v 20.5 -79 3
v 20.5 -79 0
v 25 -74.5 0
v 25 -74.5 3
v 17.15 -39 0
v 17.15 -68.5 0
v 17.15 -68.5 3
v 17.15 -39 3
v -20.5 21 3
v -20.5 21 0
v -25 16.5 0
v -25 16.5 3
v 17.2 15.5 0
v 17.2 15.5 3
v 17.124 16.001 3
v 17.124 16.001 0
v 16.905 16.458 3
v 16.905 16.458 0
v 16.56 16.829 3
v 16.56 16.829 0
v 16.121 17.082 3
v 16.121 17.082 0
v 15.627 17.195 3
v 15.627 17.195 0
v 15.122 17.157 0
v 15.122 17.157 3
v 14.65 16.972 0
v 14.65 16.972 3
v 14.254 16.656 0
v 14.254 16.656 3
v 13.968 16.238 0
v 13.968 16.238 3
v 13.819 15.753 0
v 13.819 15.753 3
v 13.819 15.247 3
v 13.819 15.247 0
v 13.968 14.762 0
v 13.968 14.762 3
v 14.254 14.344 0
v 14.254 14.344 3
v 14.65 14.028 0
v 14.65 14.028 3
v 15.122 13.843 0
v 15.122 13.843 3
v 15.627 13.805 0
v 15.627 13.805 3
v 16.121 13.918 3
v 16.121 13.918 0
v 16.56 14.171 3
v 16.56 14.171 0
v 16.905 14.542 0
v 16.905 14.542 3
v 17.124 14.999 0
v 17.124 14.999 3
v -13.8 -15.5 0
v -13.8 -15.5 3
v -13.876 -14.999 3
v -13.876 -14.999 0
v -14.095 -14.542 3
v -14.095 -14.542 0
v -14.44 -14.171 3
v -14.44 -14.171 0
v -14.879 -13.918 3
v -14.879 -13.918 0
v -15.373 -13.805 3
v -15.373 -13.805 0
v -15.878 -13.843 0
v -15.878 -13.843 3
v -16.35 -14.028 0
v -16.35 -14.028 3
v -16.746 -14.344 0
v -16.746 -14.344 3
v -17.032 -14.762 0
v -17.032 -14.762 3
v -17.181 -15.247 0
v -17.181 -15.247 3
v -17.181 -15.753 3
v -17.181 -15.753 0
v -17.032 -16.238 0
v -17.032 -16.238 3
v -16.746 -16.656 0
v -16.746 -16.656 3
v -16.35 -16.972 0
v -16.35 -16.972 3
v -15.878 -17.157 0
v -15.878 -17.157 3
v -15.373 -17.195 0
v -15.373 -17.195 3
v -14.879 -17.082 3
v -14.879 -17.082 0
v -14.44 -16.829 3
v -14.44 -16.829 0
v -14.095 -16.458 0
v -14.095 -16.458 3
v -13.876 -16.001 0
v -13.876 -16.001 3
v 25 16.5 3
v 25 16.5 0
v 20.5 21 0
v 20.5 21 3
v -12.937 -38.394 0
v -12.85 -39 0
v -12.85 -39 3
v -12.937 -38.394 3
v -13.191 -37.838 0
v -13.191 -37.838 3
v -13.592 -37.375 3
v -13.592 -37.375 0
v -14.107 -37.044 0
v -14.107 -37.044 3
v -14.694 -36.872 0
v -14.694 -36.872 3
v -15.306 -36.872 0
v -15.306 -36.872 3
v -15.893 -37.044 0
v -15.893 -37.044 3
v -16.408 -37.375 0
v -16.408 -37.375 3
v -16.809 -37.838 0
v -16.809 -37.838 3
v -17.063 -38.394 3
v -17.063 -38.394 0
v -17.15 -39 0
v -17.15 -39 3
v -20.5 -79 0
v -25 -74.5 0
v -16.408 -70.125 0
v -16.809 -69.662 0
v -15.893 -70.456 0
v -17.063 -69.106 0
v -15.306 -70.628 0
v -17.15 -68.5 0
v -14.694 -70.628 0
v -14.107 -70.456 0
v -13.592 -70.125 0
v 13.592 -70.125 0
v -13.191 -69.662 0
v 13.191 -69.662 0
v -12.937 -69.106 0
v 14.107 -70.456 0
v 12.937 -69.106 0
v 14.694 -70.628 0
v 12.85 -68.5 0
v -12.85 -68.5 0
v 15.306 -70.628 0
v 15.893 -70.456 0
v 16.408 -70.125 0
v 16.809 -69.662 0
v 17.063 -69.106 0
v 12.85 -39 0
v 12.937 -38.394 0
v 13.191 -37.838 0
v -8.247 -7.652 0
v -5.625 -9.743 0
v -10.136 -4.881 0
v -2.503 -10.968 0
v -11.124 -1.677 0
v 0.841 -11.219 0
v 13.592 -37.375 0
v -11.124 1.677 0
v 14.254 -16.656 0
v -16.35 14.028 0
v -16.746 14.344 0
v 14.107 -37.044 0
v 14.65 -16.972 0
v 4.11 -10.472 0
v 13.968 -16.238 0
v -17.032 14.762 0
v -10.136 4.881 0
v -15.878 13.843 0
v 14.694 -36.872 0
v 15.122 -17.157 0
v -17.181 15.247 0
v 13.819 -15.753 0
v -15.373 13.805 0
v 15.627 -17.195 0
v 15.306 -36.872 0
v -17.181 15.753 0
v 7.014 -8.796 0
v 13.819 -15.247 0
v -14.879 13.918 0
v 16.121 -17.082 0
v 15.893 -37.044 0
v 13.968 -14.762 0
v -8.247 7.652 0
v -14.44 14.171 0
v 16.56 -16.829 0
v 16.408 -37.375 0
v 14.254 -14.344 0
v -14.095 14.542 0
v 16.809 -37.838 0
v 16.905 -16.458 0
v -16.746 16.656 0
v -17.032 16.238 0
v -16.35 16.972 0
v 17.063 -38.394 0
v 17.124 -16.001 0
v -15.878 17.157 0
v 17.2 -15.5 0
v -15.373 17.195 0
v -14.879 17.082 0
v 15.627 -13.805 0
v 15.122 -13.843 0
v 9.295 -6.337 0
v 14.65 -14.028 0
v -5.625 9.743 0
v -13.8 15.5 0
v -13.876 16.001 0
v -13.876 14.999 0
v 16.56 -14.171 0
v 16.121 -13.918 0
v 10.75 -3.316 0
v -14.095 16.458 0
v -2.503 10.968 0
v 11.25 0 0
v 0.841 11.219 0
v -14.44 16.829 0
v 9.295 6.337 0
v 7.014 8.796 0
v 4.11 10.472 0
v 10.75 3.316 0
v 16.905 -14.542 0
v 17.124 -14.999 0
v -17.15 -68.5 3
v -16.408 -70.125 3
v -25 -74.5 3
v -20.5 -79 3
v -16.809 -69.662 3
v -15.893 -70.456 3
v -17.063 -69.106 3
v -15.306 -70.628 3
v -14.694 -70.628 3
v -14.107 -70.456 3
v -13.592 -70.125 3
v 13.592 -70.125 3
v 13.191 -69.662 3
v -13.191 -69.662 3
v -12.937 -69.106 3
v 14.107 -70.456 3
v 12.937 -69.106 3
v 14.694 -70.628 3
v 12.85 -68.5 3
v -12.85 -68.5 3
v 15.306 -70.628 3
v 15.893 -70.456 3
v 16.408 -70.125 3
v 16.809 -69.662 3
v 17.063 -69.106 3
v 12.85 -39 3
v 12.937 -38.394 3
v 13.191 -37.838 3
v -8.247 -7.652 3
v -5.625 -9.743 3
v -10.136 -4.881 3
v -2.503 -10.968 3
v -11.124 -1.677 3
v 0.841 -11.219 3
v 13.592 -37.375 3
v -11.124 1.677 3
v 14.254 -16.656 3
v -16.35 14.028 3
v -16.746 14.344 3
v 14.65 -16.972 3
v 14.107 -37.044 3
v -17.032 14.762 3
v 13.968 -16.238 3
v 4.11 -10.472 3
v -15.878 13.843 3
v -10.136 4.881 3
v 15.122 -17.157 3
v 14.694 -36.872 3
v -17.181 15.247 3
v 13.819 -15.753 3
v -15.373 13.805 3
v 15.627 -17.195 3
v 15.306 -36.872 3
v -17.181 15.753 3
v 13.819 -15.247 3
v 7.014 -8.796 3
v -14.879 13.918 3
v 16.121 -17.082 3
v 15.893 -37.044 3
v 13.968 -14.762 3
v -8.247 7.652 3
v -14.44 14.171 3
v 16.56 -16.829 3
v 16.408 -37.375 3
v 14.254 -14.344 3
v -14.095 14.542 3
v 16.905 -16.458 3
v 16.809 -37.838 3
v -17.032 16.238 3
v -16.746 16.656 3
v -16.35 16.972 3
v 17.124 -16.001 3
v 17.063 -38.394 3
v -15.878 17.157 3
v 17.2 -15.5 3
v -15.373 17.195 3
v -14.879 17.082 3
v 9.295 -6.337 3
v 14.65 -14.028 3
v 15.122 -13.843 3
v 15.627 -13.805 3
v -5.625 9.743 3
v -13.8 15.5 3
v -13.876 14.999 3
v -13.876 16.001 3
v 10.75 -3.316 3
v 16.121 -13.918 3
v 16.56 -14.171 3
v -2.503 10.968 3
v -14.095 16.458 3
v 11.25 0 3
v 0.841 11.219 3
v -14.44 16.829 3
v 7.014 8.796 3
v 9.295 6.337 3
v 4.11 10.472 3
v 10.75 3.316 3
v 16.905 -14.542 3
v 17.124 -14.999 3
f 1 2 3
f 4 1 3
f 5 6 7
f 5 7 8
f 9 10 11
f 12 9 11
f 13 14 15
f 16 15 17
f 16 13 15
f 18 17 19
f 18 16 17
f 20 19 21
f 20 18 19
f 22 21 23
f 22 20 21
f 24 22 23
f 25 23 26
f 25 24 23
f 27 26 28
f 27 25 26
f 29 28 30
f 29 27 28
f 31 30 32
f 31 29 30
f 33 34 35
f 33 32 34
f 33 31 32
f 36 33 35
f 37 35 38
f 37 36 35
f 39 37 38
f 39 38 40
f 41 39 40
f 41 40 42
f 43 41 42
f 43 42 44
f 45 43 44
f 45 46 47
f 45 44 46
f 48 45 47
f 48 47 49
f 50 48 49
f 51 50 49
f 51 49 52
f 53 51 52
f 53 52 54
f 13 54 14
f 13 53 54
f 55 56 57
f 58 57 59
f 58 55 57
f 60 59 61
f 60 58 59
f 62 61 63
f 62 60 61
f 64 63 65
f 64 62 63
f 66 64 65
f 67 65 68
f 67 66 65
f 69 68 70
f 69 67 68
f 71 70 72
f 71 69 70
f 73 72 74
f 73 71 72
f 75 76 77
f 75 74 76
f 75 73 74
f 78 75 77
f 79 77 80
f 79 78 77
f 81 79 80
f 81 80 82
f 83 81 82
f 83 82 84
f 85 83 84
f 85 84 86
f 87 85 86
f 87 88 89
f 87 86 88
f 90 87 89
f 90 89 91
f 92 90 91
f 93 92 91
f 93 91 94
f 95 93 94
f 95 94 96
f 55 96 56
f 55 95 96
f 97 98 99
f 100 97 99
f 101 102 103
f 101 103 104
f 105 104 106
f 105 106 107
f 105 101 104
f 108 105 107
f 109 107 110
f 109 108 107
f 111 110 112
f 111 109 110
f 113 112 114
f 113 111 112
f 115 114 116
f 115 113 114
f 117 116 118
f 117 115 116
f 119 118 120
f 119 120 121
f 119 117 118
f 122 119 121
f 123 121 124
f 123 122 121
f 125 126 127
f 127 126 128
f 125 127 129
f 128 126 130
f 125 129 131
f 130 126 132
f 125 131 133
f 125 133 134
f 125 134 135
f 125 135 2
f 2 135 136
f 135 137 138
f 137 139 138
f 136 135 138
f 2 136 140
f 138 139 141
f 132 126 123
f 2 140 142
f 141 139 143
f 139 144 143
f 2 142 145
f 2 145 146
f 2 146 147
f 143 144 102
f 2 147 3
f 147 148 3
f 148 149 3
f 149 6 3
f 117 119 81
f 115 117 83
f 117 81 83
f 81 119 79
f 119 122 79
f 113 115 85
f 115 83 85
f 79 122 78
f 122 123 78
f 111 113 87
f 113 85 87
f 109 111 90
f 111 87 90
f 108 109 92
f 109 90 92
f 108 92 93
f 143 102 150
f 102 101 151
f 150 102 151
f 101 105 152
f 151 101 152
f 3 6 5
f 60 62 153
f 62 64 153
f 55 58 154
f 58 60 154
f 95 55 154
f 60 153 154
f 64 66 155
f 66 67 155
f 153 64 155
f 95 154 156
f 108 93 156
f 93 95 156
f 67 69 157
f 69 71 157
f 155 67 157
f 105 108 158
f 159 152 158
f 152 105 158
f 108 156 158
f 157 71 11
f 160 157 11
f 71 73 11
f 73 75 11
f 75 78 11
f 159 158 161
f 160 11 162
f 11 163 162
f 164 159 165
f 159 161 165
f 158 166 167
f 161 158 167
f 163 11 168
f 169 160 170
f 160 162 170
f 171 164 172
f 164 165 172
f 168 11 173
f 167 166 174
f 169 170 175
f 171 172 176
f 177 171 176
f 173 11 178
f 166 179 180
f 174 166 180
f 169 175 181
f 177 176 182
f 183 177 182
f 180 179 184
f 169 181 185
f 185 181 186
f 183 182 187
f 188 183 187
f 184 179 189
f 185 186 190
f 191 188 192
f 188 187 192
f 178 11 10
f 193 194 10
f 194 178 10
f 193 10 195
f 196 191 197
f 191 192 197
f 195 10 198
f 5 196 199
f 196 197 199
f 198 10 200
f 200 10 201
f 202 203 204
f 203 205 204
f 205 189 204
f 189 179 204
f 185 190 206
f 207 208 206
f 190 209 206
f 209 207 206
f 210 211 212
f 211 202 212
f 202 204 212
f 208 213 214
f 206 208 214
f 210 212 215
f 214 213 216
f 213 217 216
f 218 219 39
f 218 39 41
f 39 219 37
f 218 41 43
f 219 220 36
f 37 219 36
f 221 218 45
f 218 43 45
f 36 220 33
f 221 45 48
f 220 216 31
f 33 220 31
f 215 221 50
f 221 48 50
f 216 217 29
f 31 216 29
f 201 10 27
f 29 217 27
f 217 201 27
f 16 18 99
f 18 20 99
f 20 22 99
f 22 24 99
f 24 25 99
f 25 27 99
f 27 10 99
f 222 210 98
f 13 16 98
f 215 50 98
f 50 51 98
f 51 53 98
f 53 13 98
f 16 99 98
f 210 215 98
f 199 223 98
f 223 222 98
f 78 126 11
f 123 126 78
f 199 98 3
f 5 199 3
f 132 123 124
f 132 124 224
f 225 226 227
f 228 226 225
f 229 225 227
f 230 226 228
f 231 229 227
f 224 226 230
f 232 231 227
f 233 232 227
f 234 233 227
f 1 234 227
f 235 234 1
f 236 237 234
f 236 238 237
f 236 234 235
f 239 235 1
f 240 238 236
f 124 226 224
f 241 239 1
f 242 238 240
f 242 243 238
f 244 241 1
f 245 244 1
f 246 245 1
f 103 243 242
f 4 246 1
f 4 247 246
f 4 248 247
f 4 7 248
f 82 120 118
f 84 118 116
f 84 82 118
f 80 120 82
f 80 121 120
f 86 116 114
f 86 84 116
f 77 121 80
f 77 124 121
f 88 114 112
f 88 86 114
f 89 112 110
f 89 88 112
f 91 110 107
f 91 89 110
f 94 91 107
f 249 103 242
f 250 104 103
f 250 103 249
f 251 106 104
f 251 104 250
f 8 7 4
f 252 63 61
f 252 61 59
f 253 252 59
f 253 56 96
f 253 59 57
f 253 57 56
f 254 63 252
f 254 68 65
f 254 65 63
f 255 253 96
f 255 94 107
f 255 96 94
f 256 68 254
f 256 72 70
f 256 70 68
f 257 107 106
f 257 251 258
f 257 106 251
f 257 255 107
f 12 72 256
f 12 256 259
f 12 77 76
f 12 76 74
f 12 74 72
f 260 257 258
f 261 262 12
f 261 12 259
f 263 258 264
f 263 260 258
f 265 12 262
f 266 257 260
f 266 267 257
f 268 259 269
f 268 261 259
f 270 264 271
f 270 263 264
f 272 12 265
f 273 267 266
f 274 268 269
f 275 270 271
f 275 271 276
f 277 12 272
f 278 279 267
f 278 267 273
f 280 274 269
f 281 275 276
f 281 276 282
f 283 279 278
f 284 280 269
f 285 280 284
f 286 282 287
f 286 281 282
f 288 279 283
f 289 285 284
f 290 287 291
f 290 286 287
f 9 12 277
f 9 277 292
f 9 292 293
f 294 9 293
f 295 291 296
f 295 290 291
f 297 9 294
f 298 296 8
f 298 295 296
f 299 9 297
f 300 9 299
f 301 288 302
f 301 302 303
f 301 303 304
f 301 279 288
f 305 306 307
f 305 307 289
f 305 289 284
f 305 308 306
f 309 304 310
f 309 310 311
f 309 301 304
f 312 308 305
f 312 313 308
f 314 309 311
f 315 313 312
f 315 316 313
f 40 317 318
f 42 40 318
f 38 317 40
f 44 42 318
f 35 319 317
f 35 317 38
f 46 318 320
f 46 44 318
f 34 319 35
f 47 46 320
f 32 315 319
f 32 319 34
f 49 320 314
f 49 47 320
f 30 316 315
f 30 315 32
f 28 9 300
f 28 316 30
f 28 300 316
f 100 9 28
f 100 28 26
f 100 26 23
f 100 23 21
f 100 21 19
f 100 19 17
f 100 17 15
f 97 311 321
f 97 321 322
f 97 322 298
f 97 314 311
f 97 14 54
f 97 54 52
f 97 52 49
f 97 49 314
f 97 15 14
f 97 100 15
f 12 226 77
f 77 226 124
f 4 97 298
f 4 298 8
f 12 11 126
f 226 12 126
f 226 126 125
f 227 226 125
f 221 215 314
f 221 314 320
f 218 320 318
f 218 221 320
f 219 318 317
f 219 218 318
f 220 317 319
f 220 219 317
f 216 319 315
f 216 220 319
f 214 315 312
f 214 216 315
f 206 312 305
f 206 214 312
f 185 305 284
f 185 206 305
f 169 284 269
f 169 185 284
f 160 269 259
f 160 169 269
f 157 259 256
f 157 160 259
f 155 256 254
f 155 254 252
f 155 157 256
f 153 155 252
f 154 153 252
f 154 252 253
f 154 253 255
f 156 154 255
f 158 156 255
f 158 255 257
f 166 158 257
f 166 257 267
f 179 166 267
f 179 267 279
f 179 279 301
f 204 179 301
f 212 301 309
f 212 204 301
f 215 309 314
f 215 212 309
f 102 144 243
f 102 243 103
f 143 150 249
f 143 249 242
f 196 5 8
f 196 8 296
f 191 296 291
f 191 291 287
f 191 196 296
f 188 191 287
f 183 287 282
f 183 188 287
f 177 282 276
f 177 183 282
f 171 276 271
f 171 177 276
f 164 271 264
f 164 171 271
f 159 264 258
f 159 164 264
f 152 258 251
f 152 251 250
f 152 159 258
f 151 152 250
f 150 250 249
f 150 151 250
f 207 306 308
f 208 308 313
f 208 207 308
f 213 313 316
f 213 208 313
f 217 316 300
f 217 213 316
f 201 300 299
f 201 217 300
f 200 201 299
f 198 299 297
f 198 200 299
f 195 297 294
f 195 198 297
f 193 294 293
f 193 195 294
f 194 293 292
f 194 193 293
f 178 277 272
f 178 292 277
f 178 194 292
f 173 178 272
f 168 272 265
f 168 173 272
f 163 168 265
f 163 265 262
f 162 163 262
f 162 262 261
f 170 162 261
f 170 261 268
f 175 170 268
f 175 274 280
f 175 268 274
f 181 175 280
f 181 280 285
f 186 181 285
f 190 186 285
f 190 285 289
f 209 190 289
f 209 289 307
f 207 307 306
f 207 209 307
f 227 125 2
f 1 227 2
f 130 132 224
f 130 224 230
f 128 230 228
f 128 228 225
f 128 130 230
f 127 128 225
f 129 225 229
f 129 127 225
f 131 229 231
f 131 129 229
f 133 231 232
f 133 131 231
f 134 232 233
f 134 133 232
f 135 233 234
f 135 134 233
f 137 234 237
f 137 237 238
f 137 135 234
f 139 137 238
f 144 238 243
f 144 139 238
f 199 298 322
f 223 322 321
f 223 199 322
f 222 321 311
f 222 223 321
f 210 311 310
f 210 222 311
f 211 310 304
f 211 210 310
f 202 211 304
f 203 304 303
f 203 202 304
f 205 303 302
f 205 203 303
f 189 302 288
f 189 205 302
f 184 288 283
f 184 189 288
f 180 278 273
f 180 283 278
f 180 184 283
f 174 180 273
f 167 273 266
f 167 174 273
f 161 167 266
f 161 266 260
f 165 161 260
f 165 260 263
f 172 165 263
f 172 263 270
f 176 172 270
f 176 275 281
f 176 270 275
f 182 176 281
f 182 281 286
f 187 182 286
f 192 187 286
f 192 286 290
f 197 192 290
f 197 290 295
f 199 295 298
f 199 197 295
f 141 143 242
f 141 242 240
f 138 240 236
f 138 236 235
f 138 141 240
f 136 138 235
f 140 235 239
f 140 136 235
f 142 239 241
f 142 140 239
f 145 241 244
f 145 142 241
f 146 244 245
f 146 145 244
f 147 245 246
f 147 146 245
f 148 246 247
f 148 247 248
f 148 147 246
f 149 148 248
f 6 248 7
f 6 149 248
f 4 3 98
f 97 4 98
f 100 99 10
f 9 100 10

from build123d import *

# Parameters (mm, degrees)
SKETCH_R    = 11.25
PAD_DEPTH   = 3
SKETCH001_R = 1.7
HOLE_DEPTH  = 25


with BuildPart() as part:
    # Sketch → Pad (new body)
    with BuildSketch(Plane.XY):
        Polygon((20.5, 21), (-20.5, 21), (-25, 16.5), (-25, -74.5), (-20.5, -79), (20.5, -79), (25, -74.5), (25, 16.5), align=None)
        Circle(SKETCH_R, mode=Mode.SUBTRACT)
        with BuildLine():
            ThreePointArc((-12.85, -39), (-15, -36.85), (-17.15, -39))
            Line((-17.15, -39), (-17.15, -68.5))
            ThreePointArc((-17.15, -68.5), (-15, -70.65), (-12.85, -68.5))
            Line((-12.85, -68.5), (-12.85, -39))
        make_face(mode=Mode.SUBTRACT)
        with BuildLine():
            ThreePointArc((17.15, -39), (15, -36.85), (12.85, -39))
            Line((12.85, -39), (12.85, -68.5))
            ThreePointArc((12.85, -68.5), (15, -70.65), (17.15, -68.5))
            Line((17.15, -68.5), (17.15, -39))
        make_face(mode=Mode.SUBTRACT)
    extrude(amount=PAD_DEPTH)

    # Sketch001 → Hole (cut)
    with BuildSketch(Plane.XY):
        with Locations((-15.5, 15.5)):
            Circle(SKETCH001_R)
        with Locations((15.5, 15.5)):
            Circle(SKETCH001_R)
        with Locations((15.5, -15.5)):
            Circle(SKETCH001_R)
        with Locations((-15.5, -15.5)):
            Circle(SKETCH001_R)
    extrude(amount=HOLE_DEPTH, mode=Mode.SUBTRACT)


solid = part.part
